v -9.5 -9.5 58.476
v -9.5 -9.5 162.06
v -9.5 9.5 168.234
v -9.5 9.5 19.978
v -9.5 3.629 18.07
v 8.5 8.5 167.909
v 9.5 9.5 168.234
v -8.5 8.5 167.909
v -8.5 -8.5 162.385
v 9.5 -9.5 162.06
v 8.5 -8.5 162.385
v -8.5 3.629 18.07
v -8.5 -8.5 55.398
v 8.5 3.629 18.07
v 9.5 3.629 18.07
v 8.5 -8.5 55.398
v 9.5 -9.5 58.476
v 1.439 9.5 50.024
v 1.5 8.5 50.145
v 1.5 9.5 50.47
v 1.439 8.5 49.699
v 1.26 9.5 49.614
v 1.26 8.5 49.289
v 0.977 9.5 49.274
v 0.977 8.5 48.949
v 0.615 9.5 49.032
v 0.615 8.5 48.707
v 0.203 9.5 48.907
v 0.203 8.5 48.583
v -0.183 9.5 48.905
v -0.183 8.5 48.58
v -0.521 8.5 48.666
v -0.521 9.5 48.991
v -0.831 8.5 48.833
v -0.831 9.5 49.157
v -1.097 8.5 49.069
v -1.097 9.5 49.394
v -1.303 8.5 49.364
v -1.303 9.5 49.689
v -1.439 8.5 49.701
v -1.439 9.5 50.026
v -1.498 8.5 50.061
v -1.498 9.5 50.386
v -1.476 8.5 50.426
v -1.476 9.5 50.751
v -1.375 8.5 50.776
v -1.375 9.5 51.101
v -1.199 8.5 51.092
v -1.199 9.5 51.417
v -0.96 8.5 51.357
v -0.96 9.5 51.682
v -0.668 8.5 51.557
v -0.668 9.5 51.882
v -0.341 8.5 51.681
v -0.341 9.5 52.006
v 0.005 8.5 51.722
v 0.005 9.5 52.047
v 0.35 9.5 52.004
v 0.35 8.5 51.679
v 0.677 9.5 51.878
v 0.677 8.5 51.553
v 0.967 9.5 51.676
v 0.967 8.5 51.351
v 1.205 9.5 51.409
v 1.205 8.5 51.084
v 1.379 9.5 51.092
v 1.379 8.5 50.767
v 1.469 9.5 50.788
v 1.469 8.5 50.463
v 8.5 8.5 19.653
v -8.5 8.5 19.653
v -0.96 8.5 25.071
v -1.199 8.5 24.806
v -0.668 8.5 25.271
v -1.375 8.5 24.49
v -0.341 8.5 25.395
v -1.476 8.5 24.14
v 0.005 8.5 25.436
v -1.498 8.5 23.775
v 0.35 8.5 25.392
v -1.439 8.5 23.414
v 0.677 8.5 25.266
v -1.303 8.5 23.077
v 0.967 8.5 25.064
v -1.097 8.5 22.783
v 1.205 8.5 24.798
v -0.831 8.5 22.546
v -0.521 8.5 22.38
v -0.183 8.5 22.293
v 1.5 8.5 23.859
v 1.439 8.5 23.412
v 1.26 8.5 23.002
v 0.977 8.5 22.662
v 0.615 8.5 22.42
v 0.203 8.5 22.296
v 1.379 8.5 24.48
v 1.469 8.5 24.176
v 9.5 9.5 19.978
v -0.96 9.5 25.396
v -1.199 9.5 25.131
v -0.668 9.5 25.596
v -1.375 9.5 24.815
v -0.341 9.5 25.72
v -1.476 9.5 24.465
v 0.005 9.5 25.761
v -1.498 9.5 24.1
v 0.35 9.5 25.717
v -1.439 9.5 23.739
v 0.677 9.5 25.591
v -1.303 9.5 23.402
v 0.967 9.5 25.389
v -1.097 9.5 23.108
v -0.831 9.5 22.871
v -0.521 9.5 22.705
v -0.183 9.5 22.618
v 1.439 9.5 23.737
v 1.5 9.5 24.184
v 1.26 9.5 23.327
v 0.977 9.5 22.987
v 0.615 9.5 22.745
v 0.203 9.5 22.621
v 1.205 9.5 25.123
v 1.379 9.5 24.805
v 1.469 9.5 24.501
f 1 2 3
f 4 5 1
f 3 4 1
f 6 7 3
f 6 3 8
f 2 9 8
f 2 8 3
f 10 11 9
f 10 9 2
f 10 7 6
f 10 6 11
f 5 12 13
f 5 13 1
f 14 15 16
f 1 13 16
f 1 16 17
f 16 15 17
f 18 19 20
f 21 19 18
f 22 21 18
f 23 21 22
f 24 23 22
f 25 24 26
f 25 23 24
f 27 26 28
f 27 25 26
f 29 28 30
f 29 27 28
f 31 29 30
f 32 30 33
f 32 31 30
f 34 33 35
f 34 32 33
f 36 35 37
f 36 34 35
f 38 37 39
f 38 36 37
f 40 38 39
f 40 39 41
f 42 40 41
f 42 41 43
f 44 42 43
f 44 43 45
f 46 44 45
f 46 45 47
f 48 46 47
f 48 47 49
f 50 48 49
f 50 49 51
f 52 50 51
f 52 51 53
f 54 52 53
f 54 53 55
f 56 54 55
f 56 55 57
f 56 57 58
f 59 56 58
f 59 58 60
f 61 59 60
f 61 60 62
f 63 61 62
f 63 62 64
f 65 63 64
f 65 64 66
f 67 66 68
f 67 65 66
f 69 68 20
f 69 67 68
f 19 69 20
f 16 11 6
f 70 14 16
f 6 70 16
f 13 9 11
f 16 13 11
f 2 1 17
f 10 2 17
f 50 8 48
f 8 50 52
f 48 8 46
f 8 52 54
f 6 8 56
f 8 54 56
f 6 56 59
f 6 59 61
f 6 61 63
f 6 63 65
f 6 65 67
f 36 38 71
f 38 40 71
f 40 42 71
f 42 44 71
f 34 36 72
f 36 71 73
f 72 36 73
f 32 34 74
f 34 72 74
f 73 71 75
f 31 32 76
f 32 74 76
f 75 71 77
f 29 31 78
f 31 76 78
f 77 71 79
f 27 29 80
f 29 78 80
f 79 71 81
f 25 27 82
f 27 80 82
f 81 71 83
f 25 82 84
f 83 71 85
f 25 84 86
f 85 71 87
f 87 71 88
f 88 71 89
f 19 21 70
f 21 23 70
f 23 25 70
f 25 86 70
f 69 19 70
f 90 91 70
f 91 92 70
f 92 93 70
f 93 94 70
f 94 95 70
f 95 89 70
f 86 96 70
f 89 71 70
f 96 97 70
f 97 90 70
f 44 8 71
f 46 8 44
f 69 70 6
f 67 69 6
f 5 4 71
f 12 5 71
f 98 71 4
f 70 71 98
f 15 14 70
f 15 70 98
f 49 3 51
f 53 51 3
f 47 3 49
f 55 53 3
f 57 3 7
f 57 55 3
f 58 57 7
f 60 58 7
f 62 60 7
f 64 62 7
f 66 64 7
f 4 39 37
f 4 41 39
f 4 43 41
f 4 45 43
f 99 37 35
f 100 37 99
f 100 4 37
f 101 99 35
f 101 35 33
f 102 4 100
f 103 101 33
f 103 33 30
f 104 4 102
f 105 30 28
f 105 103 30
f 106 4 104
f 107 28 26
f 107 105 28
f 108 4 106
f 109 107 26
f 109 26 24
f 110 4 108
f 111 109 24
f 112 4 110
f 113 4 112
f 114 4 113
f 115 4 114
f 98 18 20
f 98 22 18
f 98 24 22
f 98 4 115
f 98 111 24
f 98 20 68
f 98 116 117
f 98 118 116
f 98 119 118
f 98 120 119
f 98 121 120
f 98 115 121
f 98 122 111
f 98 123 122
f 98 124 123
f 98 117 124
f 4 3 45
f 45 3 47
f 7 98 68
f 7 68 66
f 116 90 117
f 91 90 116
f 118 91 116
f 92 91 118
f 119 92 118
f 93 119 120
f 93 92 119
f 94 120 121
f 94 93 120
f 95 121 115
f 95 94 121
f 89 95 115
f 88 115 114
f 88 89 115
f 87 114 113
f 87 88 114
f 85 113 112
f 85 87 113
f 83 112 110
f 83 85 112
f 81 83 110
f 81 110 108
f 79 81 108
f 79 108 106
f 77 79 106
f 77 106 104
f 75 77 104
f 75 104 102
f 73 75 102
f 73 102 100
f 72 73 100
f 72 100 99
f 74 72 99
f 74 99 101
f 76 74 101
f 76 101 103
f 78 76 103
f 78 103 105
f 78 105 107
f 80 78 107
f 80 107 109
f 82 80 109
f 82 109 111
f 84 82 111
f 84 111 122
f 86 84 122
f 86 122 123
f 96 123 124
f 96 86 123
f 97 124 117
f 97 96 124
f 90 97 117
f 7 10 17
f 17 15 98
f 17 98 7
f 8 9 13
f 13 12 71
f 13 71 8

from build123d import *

# Parameters (mm, degrees)
ESBO_O1_W                = 19
ESBO_O1_H                = 19
RESSALTO_EXTRUS_O1_DEPTH = 260
CASCA2_T                 = -1
CORTE_EXTRUS_O1_DEPTH    = 20
CORTE_EXTRUS_O3_DEPTH    = 20
ESBO_O5_R                = 1.5
CORTE_EXTRUS_O4_DEPTH    = 52.987151397
ESBO_O7_W                = 19
ESBO_O7_H                = 19
CORTE_EXTRUS_O6_DEPTH    = 52.987151397


with BuildPart() as part:
    # Esboço1 → Ressalto-extrusão1 (new body)
    with BuildSketch(Plane.XY):
        Rectangle(ESBO_O1_W, ESBO_O1_H)
    extrude(amount=RESSALTO_EXTRUS_O1_DEPTH)

    # Casca2
    casca2_openings = [part.faces().sort_by_distance(p)[0] for p in [
        (0, 0, 260),
        (0, 0, 0),
    ]]
    offset(amount=CASCA2_T, openings=casca2_openings, kind=Kind.INTERSECTION)

    # Esboço2 → Corte-extrusão1 (cut, through all)
    with BuildSketch(Plane(origin=(9.5, 0, 0), x_dir=(0, 0, -1), z_dir=(1, 0, 0))):
        Polygon((0, 9.5), (-58.475987206, -9.5), (0, -9.5), align=None)
    extrude(amount=-CORTE_EXTRUS_O1_DEPTH, mode=Mode.SUBTRACT)

    # Esboço4 → Corte-extrusão3 (cut, through all)
    with BuildSketch(Plane(origin=(9.5, 0, 0), x_dir=(0, 0, -1), z_dir=(1, 0, 0))):
        Polygon((-168.550335734, 10.473717073), (-161.289503816, -11.872825786), (-264.812755879, -45.509569399), (-289.05777752, 22.149749677), (-184.516070462, 59.611196004), align=None)
    extrude(amount=-CORTE_EXTRUS_O3_DEPTH, mode=Mode.SUBTRACT)

    # Esboço5 → Corte-extrusão4 (cut, through all)
    with BuildSketch(Plane(origin=(0, 9.5, 0), x_dir=(1, 0, 0), z_dir=(0, 0.951056516, 0.309016994))):
        with Locations((0, -23)):
            Circle(ESBO_O5_R)
        with Locations((0, -48)):
            Circle(ESBO_O5_R)
    extrude(amount=CORTE_EXTRUS_O4_DEPTH, mode=Mode.SUBTRACT)

    # Esboço7 → Corte-extrusão6 (cut, through all)
    with BuildSketch(Plane(origin=(0, 8.592830723, 2.791979948), x_dir=(1, 0, 0), z_dir=(0, -0.951056516, -0.309016994))):
        with Locations((0, 6.564338553)):
            Rectangle(ESBO_O7_W, ESBO_O7_H)
    extrude(amount=-CORTE_EXTRUS_O6_DEPTH, mode=Mode.SUBTRACT)


solid = part.part
